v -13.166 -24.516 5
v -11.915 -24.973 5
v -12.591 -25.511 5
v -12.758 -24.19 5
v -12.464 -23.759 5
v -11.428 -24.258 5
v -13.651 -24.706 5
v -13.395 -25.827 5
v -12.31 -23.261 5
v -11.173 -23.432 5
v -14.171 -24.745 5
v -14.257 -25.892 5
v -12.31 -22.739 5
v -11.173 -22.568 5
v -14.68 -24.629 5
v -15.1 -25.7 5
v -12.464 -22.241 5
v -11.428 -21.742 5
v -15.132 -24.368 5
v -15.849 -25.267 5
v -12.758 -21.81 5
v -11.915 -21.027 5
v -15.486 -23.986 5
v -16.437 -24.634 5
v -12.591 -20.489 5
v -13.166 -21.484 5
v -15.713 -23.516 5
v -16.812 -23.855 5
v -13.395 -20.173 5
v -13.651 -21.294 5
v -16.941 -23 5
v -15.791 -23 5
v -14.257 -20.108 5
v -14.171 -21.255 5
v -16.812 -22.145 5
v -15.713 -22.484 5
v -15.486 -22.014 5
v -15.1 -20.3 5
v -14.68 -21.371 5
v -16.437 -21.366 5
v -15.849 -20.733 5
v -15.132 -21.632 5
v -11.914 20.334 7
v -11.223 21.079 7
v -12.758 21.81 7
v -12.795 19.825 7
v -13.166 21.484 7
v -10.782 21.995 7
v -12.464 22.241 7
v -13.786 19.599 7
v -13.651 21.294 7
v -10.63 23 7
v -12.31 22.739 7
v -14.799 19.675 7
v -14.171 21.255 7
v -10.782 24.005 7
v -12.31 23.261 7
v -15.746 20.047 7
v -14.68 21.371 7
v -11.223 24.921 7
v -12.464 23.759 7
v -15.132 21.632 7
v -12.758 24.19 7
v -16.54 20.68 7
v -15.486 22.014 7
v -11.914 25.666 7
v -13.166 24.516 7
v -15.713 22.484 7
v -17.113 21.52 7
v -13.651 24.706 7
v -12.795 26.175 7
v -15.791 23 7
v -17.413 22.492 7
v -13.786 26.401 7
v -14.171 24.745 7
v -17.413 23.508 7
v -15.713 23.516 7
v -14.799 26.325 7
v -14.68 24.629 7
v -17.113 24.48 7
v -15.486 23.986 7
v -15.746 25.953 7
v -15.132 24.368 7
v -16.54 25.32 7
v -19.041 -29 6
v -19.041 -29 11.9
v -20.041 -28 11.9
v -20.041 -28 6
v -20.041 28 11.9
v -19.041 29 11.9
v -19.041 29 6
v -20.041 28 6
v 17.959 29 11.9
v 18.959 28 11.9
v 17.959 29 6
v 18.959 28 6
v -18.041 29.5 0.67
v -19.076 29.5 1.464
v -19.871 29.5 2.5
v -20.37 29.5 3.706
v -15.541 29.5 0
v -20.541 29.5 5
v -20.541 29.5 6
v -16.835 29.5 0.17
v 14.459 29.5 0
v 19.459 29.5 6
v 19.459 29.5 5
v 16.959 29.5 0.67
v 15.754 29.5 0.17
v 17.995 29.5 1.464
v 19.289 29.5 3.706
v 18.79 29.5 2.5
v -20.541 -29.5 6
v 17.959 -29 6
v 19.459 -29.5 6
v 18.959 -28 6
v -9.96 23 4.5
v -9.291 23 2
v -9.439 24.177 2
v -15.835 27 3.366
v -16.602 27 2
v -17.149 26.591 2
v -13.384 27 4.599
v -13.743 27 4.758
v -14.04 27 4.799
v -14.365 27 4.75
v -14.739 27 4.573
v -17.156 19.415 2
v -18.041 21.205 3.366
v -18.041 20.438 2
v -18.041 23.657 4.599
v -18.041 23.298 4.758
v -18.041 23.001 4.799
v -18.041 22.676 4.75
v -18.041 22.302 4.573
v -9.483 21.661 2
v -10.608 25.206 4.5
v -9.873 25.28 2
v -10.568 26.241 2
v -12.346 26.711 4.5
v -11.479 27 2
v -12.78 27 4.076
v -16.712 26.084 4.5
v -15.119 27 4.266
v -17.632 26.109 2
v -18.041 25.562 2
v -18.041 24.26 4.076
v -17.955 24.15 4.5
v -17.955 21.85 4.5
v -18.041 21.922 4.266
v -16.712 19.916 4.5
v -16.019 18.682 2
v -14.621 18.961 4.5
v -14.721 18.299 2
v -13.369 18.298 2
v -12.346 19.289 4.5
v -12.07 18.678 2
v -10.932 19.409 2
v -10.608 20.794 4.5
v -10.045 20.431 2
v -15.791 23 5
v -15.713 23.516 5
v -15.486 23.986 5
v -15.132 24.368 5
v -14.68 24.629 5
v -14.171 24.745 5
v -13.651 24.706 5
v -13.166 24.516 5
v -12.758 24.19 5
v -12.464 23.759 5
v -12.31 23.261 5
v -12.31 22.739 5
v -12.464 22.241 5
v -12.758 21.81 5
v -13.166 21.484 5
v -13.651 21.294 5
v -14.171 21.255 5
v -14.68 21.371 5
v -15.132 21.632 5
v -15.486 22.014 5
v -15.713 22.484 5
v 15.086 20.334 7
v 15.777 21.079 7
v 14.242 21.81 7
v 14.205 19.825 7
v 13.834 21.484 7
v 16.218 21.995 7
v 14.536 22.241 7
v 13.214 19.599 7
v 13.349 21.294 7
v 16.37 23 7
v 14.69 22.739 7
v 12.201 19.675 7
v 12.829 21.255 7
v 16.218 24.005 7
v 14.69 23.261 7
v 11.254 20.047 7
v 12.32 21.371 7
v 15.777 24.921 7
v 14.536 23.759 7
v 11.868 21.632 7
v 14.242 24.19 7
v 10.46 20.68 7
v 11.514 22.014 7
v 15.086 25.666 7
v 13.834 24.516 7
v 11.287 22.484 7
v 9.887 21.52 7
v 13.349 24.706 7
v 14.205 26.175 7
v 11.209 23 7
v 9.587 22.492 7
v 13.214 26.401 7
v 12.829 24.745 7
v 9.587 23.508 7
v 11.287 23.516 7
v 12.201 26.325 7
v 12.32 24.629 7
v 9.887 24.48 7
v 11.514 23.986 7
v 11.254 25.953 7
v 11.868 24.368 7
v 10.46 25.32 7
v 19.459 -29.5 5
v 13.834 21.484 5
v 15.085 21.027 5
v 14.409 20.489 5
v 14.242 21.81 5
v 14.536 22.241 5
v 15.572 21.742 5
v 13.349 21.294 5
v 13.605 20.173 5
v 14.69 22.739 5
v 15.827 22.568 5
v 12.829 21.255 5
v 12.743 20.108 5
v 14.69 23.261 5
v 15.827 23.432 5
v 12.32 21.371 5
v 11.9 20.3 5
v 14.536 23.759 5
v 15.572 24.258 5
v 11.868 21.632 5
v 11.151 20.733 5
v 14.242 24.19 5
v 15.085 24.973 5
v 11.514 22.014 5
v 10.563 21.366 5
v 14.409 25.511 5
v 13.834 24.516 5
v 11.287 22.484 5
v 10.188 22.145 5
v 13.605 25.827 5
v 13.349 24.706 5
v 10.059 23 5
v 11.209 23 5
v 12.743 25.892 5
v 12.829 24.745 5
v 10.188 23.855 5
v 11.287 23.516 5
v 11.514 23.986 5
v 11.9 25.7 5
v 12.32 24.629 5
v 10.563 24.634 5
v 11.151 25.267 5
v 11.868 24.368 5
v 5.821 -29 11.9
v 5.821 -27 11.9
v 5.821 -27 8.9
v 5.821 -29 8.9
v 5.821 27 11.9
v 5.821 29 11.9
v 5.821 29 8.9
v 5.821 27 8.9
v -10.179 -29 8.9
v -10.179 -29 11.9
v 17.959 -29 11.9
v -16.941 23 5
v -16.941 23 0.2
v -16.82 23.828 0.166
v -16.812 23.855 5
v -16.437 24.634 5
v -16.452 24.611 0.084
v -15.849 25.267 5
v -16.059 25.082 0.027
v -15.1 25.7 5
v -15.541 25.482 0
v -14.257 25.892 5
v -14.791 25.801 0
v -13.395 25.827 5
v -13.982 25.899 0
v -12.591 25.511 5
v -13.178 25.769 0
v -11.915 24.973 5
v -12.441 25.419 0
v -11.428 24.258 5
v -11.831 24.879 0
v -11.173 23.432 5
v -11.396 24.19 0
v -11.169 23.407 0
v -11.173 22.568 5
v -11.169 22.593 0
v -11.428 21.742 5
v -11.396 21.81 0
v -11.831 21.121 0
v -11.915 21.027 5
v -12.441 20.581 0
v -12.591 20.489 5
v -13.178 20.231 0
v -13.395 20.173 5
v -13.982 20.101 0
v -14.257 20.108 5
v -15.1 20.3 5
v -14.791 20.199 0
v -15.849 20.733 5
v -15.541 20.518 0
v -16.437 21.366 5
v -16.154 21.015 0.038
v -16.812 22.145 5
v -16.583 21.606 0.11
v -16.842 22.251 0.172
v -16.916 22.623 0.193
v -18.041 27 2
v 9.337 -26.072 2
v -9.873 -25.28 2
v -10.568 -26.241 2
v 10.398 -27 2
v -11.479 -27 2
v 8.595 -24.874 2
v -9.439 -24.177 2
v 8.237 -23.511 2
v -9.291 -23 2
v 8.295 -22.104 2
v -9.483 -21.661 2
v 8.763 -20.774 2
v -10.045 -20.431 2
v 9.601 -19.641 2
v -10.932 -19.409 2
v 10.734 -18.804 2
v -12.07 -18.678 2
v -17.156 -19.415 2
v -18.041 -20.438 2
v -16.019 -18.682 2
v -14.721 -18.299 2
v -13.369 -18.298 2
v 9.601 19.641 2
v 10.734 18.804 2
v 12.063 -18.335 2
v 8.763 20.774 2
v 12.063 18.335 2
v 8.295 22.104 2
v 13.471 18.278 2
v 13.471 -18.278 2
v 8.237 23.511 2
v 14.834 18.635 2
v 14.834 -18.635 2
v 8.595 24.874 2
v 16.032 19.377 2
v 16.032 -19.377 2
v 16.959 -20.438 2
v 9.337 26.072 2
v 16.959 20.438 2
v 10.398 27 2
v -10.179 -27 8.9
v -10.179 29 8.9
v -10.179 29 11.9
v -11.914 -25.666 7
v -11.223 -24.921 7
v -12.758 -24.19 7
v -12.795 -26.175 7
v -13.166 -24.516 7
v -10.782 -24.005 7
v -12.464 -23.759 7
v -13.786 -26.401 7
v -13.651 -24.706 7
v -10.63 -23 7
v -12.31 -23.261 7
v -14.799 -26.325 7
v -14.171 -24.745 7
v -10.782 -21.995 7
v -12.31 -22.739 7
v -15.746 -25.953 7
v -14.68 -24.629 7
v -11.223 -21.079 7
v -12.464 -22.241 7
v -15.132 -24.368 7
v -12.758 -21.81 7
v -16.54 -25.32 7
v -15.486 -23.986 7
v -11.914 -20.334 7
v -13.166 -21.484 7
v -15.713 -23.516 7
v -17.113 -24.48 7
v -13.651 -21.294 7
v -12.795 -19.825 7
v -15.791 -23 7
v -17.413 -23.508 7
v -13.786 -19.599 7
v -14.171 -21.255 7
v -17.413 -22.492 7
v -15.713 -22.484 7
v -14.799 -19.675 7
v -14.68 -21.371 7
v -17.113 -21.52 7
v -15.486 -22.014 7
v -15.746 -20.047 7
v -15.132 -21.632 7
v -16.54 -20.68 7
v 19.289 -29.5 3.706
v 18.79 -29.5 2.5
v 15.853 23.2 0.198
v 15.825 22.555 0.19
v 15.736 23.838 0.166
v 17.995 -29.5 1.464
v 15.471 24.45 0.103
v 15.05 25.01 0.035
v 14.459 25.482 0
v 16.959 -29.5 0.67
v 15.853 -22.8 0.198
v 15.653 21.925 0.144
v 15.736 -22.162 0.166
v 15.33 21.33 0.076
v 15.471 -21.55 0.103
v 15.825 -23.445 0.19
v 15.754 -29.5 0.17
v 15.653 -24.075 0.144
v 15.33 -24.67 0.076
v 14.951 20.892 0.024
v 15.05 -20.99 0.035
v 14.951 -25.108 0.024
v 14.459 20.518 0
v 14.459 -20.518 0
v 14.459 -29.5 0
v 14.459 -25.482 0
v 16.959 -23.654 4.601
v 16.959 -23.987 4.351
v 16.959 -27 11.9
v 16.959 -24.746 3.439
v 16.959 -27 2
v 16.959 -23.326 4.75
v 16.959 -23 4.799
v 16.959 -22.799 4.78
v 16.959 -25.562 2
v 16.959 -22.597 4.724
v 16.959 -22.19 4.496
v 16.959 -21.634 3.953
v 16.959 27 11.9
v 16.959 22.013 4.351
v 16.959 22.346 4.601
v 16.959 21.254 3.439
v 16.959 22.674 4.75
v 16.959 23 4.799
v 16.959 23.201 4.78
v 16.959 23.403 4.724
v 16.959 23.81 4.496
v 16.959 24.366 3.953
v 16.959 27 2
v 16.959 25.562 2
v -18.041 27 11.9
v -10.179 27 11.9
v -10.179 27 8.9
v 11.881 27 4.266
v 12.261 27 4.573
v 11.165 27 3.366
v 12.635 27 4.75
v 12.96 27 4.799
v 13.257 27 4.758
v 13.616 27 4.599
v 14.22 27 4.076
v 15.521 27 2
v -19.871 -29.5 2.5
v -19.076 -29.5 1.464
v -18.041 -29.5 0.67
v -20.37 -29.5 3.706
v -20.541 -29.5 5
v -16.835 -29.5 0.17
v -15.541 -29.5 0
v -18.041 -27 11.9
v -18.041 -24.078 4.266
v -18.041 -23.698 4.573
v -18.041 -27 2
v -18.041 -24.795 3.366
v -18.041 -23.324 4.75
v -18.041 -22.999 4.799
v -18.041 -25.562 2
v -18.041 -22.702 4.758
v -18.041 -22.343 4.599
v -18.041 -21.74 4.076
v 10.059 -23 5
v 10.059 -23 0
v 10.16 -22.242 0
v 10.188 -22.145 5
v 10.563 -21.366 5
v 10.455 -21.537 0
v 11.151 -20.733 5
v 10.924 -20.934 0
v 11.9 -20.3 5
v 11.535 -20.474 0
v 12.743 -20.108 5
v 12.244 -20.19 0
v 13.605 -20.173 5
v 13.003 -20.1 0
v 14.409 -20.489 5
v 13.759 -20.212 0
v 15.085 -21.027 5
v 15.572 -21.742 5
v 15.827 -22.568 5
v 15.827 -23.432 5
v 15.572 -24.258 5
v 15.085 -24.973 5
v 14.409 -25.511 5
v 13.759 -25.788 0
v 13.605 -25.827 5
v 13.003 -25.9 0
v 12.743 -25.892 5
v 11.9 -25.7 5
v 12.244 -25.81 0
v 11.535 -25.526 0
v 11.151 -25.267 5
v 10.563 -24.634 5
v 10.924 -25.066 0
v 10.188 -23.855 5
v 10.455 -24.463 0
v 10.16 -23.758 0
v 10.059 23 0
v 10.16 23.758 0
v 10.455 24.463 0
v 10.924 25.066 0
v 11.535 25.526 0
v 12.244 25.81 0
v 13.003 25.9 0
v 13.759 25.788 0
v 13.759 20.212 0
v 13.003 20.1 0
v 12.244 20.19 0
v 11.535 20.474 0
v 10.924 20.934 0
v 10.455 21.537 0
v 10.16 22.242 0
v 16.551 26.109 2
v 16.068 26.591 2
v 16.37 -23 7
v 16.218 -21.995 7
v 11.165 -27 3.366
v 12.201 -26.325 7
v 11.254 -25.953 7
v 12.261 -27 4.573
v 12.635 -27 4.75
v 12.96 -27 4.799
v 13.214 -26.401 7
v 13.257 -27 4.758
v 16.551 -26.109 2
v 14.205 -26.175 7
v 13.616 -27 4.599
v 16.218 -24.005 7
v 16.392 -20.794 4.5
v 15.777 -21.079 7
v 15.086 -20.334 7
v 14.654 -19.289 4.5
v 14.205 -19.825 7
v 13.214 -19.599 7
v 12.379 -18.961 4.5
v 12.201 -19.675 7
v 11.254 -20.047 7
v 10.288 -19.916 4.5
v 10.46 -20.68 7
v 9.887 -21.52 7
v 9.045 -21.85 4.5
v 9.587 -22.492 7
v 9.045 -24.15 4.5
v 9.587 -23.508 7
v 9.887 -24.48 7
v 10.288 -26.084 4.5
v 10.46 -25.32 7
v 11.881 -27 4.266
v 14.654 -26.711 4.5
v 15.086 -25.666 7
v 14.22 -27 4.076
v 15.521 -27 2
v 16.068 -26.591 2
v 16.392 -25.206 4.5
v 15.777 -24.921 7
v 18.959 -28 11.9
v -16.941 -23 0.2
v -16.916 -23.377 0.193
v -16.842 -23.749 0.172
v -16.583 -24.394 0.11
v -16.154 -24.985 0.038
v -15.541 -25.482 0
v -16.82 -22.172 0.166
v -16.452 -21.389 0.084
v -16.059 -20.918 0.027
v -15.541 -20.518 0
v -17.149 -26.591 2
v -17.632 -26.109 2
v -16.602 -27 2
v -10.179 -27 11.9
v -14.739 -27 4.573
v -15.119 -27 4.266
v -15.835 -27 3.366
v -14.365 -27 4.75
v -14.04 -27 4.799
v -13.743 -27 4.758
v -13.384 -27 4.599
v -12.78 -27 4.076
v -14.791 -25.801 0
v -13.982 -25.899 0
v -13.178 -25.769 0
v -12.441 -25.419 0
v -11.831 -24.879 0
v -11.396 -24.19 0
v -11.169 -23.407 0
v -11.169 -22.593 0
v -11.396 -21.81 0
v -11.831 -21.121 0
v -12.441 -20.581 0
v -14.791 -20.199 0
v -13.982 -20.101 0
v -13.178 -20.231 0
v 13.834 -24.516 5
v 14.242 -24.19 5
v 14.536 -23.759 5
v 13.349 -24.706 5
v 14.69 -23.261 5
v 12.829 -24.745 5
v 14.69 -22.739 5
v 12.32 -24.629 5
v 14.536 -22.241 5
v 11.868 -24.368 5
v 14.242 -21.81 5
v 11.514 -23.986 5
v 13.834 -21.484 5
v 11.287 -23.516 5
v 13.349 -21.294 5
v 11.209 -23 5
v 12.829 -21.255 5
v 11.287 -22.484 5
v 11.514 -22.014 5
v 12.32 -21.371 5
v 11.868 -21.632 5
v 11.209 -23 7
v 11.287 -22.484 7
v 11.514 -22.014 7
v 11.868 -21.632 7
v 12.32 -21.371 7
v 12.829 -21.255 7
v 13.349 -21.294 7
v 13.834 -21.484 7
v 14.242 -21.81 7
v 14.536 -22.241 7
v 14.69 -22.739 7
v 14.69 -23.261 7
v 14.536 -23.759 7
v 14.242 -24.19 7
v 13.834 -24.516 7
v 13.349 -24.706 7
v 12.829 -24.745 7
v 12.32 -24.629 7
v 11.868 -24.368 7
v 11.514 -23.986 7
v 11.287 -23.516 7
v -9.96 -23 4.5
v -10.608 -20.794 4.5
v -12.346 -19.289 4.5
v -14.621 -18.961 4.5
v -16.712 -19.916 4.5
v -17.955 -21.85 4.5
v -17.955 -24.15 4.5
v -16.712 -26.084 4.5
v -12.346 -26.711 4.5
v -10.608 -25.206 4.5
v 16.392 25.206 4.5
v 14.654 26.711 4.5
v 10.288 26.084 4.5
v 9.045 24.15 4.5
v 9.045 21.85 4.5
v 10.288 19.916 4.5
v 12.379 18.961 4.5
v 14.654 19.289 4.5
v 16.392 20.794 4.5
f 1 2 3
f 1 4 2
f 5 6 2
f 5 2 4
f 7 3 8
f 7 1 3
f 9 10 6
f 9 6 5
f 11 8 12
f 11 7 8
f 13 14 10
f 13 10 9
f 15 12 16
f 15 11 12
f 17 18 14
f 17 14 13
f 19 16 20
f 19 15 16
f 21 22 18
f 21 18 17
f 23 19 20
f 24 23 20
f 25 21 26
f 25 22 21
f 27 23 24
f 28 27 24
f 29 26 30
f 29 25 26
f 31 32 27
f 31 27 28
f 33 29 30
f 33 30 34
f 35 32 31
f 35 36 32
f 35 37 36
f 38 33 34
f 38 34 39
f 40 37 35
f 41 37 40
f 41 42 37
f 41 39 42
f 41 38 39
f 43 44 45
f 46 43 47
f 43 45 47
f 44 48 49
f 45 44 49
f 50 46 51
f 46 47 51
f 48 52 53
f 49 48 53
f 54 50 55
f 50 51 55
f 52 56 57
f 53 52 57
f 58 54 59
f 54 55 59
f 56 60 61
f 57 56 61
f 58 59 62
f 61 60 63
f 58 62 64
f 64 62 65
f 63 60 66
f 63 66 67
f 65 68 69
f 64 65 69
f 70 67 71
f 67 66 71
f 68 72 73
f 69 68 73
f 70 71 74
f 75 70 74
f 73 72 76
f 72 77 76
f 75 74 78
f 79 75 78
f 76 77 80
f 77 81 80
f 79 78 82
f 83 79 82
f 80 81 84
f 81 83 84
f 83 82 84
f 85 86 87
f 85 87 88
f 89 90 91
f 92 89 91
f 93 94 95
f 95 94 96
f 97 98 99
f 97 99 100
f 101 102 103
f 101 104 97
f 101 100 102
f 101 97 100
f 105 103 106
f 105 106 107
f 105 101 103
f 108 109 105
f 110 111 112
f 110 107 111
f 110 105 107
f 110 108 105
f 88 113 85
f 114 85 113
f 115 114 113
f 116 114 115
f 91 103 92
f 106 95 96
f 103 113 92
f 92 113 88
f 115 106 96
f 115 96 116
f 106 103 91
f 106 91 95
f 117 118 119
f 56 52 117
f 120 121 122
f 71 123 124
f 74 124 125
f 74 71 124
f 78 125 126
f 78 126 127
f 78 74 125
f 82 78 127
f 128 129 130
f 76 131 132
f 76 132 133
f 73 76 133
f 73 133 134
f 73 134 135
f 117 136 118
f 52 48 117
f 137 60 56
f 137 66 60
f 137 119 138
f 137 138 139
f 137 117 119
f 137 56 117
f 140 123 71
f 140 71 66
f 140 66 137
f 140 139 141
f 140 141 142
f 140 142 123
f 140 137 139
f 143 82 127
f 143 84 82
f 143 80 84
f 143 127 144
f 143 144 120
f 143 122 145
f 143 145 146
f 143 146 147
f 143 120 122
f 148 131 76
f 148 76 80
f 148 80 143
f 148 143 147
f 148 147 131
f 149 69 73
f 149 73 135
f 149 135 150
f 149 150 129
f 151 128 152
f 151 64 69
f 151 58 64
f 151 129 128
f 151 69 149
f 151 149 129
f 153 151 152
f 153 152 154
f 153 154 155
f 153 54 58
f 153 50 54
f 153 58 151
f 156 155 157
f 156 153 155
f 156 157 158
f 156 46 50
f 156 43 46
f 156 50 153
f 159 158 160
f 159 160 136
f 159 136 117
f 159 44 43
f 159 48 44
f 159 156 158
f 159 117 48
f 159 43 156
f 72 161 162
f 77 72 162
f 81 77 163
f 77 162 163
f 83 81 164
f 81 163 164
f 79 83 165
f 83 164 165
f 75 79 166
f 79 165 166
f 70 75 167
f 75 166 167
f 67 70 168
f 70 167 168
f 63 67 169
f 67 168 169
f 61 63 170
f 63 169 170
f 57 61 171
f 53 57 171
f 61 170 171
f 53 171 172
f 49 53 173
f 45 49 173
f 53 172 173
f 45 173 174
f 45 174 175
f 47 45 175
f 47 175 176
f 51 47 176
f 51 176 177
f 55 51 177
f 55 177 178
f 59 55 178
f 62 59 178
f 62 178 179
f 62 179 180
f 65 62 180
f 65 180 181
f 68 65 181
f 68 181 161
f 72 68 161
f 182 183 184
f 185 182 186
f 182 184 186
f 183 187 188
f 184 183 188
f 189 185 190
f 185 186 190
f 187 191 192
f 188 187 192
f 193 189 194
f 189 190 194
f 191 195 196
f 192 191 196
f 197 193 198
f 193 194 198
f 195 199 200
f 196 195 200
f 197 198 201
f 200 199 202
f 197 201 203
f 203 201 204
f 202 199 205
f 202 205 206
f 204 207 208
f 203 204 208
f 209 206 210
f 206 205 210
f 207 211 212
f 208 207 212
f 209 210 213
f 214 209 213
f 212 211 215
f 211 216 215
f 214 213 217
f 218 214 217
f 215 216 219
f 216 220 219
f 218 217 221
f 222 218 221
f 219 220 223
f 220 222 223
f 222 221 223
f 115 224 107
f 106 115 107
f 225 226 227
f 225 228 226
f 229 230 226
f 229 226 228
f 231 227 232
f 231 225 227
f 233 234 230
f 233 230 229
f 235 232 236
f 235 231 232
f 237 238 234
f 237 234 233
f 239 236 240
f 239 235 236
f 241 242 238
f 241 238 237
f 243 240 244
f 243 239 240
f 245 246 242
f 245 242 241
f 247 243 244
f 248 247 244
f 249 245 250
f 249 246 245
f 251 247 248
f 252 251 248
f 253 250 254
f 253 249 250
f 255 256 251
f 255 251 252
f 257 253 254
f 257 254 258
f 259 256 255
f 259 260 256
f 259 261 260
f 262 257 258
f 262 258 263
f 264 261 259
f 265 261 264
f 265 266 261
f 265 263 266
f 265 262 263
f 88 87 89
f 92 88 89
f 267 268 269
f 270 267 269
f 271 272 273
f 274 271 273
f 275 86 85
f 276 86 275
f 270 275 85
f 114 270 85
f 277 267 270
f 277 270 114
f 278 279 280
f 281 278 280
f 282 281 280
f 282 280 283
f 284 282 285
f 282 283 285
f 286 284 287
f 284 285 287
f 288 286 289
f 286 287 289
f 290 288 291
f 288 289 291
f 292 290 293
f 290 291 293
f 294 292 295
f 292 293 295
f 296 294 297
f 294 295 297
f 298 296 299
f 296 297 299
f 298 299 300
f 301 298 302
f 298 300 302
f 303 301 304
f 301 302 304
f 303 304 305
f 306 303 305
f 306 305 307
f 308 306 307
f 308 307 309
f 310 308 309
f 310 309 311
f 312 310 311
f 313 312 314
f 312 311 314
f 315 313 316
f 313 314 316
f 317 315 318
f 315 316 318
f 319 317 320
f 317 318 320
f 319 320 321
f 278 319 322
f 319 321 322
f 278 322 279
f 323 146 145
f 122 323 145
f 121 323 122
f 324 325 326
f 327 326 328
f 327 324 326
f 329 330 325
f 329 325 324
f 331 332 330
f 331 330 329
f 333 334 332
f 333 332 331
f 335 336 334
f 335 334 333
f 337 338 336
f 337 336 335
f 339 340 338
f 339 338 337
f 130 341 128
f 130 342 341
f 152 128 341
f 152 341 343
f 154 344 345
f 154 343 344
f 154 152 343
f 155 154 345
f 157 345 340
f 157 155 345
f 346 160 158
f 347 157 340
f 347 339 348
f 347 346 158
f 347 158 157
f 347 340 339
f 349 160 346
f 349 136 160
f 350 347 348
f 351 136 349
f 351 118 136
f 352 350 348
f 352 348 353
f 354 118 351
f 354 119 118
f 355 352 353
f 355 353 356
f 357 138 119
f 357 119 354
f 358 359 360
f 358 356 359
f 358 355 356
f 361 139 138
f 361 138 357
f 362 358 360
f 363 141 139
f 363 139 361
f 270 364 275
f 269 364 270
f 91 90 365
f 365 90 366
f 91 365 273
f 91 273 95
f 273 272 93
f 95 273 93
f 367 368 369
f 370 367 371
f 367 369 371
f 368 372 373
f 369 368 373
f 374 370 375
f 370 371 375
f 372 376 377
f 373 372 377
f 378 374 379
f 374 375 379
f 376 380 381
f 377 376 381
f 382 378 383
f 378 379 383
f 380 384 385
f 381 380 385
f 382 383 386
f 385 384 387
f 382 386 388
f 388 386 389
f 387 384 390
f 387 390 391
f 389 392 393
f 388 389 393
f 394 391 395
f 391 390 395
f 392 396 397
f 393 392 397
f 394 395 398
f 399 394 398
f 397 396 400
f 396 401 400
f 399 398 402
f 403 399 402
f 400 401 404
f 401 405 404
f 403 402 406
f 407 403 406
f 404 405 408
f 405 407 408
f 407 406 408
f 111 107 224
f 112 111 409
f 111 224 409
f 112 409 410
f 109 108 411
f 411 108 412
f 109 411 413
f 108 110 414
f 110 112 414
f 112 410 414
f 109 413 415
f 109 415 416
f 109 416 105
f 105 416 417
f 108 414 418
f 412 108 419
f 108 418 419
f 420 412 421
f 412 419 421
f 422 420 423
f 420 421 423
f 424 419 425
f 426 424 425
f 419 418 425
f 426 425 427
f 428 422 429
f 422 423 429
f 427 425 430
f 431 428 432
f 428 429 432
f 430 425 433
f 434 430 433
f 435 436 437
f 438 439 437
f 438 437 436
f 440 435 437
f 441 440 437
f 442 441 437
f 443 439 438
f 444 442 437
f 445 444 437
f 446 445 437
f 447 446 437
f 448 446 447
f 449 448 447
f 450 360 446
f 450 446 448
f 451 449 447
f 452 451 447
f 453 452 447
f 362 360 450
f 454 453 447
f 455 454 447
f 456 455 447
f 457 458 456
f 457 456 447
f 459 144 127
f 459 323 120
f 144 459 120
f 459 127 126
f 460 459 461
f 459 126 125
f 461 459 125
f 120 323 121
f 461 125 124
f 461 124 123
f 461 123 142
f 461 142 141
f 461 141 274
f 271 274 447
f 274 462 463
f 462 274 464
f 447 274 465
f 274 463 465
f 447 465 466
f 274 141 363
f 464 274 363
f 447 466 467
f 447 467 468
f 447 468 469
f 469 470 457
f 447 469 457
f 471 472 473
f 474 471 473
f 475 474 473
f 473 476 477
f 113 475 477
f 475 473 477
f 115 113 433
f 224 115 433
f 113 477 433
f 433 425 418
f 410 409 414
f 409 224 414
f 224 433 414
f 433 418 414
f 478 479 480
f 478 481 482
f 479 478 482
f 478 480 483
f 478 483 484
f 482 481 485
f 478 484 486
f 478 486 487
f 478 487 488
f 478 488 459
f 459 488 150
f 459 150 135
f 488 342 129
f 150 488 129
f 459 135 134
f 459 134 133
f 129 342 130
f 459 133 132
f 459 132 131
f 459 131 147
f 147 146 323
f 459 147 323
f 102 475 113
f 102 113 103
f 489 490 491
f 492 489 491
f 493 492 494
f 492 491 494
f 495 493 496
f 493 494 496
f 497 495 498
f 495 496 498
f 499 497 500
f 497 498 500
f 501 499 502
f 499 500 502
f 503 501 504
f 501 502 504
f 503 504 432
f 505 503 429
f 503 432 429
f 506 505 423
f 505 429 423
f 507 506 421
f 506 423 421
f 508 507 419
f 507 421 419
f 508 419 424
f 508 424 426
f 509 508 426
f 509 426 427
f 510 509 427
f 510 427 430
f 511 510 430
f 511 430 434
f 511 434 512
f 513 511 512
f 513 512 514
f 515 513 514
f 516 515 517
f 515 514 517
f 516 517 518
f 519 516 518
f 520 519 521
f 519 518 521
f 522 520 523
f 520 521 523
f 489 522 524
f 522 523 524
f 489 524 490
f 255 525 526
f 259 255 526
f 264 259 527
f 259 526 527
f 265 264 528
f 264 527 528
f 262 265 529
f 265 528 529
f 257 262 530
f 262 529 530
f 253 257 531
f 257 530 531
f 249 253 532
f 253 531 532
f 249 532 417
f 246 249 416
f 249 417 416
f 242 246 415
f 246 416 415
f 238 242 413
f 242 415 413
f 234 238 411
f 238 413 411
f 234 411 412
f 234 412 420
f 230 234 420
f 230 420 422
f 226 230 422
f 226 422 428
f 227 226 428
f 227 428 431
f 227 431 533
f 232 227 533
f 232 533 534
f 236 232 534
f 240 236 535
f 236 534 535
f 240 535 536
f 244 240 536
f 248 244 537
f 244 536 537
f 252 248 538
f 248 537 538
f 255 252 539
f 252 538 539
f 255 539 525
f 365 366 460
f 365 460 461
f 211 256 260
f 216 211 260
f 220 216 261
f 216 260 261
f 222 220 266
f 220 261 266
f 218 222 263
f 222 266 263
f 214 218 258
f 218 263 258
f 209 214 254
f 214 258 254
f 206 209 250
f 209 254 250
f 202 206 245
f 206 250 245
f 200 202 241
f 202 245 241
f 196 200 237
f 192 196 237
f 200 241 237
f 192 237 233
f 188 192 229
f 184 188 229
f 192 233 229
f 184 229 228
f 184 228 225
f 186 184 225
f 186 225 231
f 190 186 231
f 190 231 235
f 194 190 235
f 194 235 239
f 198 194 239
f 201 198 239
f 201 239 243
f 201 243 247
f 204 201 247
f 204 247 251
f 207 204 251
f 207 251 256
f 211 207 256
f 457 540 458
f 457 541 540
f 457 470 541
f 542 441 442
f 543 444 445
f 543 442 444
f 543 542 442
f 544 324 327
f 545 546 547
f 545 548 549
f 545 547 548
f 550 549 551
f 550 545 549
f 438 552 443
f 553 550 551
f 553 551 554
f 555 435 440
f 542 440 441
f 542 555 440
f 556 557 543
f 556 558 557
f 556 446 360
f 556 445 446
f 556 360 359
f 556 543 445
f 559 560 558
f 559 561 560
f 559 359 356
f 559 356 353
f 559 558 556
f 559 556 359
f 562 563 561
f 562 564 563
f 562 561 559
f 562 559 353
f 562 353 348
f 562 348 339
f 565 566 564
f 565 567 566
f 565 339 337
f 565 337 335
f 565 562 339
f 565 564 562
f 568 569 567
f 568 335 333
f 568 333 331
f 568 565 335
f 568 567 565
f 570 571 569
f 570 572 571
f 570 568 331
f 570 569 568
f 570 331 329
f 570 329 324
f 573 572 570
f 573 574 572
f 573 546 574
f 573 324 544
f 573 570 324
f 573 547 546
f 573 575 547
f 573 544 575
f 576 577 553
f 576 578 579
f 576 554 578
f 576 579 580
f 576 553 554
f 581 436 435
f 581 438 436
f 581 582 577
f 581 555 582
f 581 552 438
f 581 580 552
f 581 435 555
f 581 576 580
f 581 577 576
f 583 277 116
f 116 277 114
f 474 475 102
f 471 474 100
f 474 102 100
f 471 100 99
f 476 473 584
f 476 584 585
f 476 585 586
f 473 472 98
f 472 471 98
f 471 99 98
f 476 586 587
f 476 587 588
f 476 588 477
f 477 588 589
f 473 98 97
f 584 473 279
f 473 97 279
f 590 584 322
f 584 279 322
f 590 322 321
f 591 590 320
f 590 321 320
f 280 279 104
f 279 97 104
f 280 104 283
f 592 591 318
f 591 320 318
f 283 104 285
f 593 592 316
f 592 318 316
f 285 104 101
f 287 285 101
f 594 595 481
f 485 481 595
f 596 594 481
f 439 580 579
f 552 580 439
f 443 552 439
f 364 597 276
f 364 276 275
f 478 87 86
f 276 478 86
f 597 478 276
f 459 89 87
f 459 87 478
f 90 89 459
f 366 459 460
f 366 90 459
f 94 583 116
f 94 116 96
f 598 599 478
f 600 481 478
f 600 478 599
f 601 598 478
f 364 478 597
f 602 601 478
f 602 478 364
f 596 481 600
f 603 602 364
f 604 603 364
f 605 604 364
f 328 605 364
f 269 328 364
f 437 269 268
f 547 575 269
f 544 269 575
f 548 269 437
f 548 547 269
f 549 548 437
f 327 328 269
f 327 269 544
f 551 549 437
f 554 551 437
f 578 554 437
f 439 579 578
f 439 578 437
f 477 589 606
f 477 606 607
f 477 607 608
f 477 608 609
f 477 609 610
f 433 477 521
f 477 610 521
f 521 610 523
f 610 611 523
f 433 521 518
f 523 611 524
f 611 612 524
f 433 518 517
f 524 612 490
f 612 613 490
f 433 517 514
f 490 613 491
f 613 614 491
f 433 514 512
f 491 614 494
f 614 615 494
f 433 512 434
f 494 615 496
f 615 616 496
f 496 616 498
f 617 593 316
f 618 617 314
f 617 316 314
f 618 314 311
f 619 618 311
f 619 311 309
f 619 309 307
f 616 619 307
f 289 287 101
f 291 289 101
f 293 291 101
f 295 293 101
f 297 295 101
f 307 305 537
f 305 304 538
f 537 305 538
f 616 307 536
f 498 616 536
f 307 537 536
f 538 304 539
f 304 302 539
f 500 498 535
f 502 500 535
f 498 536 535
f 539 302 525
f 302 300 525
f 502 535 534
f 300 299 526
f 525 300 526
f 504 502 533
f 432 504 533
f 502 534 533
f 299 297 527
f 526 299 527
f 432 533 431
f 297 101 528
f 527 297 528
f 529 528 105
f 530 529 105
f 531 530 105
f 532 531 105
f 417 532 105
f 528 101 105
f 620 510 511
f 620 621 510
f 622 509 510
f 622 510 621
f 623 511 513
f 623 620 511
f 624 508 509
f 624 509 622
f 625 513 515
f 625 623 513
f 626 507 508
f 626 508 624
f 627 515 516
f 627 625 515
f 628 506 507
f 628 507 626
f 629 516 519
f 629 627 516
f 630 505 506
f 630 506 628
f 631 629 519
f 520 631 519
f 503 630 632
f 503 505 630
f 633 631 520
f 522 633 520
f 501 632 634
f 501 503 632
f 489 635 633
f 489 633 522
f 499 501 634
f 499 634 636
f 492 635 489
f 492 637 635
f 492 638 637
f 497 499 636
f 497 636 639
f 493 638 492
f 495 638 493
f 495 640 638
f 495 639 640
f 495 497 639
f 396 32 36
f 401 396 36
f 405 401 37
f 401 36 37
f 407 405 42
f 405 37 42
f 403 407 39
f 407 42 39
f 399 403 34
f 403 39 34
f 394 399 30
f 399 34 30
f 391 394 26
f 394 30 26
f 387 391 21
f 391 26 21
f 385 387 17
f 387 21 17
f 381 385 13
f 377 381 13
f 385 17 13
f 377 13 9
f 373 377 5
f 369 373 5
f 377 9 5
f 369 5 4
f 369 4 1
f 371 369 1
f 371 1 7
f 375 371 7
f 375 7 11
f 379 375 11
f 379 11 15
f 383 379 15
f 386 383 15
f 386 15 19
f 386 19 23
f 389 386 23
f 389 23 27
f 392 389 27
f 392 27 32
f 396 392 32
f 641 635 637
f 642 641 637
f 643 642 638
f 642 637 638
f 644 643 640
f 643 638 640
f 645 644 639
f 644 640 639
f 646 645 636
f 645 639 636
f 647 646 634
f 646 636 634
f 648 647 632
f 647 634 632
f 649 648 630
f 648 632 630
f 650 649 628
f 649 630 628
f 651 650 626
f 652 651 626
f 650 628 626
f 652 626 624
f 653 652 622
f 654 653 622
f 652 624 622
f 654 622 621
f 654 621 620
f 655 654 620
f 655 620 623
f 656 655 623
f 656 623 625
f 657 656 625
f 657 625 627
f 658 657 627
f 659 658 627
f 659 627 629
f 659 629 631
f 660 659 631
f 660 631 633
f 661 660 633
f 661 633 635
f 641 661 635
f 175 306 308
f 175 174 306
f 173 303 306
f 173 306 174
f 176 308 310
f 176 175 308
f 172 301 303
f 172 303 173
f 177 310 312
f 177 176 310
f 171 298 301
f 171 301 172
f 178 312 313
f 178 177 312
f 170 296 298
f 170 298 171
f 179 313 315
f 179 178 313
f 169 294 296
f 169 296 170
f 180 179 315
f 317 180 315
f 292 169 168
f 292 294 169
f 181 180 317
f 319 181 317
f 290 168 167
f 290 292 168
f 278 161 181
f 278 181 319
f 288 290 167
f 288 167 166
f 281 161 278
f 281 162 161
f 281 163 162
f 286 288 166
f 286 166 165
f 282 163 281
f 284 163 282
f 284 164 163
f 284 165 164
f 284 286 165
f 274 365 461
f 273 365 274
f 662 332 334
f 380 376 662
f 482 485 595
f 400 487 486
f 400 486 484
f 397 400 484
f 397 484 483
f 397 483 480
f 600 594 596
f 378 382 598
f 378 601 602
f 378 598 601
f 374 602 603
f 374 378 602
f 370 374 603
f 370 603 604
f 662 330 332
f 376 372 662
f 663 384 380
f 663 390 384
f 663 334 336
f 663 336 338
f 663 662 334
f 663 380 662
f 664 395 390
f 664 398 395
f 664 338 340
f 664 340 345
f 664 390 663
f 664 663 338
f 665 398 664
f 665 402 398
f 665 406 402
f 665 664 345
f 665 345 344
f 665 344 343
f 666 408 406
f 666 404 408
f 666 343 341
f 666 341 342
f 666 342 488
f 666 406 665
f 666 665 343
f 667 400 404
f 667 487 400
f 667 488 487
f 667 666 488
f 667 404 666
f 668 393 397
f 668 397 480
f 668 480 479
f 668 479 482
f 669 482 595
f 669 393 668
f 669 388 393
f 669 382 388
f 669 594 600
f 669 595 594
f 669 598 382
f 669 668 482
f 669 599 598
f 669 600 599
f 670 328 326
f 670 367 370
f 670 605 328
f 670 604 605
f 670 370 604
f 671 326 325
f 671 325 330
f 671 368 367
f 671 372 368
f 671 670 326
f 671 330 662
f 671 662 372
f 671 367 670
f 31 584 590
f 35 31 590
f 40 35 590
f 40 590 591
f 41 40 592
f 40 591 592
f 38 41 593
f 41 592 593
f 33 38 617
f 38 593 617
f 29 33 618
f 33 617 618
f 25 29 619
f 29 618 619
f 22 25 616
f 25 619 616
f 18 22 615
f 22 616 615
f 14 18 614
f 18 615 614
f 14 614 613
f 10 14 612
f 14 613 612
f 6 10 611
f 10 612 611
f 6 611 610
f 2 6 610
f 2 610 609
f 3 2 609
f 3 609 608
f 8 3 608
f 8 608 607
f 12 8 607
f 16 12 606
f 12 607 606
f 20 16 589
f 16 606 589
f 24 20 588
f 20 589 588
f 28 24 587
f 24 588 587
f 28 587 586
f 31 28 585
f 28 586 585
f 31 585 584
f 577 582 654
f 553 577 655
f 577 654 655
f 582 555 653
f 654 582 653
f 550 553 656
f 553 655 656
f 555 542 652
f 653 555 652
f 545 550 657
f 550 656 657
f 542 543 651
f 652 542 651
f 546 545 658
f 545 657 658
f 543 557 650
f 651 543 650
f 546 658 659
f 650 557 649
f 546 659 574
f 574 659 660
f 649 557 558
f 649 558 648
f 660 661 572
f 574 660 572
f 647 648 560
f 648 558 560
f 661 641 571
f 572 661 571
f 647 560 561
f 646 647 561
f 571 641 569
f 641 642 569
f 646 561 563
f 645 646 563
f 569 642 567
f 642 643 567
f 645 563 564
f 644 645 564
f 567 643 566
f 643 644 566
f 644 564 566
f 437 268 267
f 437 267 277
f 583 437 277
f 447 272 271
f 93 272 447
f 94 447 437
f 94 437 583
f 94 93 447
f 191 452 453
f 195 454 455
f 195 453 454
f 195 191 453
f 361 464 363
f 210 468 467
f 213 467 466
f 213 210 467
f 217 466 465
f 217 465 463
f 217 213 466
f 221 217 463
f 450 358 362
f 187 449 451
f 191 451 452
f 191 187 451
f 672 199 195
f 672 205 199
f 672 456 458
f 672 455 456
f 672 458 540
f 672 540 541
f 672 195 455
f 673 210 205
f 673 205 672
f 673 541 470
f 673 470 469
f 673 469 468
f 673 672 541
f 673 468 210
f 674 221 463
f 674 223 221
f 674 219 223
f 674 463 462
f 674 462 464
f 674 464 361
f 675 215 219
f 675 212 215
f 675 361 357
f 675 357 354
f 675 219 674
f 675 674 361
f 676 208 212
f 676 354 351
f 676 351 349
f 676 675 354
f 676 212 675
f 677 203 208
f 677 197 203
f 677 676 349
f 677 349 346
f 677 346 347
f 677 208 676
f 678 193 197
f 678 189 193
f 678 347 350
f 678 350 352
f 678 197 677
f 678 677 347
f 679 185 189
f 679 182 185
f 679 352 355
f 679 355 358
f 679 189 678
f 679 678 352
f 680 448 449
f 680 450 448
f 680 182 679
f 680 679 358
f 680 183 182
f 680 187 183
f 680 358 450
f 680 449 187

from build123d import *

# Parameters (mm, degrees)
BASE_W              = 40
BASE_H              = 59
EXTRUDE_1_DEPTH     = 2
SKETCH_2_W          = 40
SKETCH_2_H          = 59
SKETCH_2_W_2        = 35
SKETCH_2_H_2        = 54
EXTRUDE_2_DEPTH     = 10
SKETCH_3_R          = 3.25
EXTRUDE_3_DEPTH     = 5
SKETCH_4_R          = 2.9
CUT_EXTRUDE_2_DEPTH = 5
CHAMFER_1_SIZE      = 1.5
CHAMFER_1_SIZE_2    = 5.598076211
SKETCH_6_R          = 1.75
CUT_EXTRUDE_3_DEPTH = 38.896736188
FILLET_1_R          = 5
SKETCH_7_W          = 40
SKETCH_7_H          = 59
SKETCH_7_W_2        = 39
SKETCH_7_H_2        = 58
CUT_EXTRUDE_6_DEPTH = 6
CHAMFER_2_SIZE      = 1
SKETCH_8_W          = 43.293299122
SKETCH_8_H          = 71.249143308
CUT_EXTRUDE_7_DEPTH = 0.1
SKETCH_9_W          = 16
SKETCH_9_H          = 3
CUT_EXTRUDE_8_DEPTH = 64.13297577


with BuildPart() as part:
    # base → Бобышка-Вытянуть1 (new body)
    with BuildSketch(Plane.XY):
        with Locations((-0.540511526, 0)):
            Rectangle(BASE_W, BASE_H)
    extrude(amount=EXTRUDE_1_DEPTH)

    # Эскиз2 → Бобышка-Вытянуть2 (add)
    with BuildSketch(Plane.XY.offset(2)):
        with Locations((-0.540511526, 0)):
            Rectangle(SKETCH_2_W, SKETCH_2_H)
        with Locations((-0.540511526, 0)):
            Rectangle(SKETCH_2_W_2, SKETCH_2_H_2, mode=Mode.SUBTRACT)
    extrude(amount=EXTRUDE_2_DEPTH)

    # Эскиз3 → Бобышка-Вытянуть3 (add)
    with BuildSketch(Plane.XY.offset(2)):
        with Locations((-14.040511526, -23)):
            Circle(SKETCH_3_R)
        with Locations((12.959488474, -23)):
            Circle(SKETCH_3_R)
        with Locations((12.959488474, 23)):
            Circle(SKETCH_3_R)
        with Locations((-14.040511526, 23)):
            Circle(SKETCH_3_R)
    extrude(amount=EXTRUDE_3_DEPTH)

    # Эскиз4 → Вырез-Вытянуть2 (cut)
    with BuildSketch(Plane(origin=(0, 0, 0), x_dir=(-1, 0, 0), z_dir=(0, 0, -1))):
        with Locations((14.040511526, -23)):
            Circle(SKETCH_4_R)
        with Locations((-12.959488474, -23)):
            Circle(SKETCH_4_R)
        with Locations((-12.959488474, 23)):
            Circle(SKETCH_4_R)
        with Locations((14.040511526, 23)):
            Circle(SKETCH_4_R)
    extrude(amount=-CUT_EXTRUDE_2_DEPTH, mode=Mode.SUBTRACT)

    # Фаска1
    # the kernel refuses this chamfer: 5.598076211, 1.5 mm, written as the material it adds along each edge
    with BuildSketch(Plane(origin=(-14.040511526, 23, 2), x_dir=(1, 0, 0), z_dir=(0, -1, 0))) as chamfer_1_piece_1_section:
        Polygon((3.25 + CHAMFER_1_SIZE, 0), (3.25, CHAMFER_1_SIZE_2), (3.25, 0), align=None)
    chamfer_1_piece_1 = revolve(axis=Axis((-14.040511526, 23, 2), (0, 0, 1)), mode=Mode.PRIVATE)
    chamfer_1_piece_1 = split(chamfer_1_piece_1, bisect_by=Plane(origin=(-14.040511526, 23, 7), z_dir=(0, 0, -1)), keep=Keep.TOP, mode=Mode.PRIVATE)
    add(chamfer_1_piece_1)
    with BuildSketch(Plane(origin=(12.959488474, 23, 2), x_dir=(1, 0, 0), z_dir=(0, -1, 0))) as chamfer_1_piece_2_section:
        Polygon((3.25 + CHAMFER_1_SIZE, 0), (3.25, CHAMFER_1_SIZE_2), (3.25, 0), align=None)
    chamfer_1_piece_2 = revolve(axis=Axis((12.959488474, 23, 2), (0, 0, 1)), mode=Mode.PRIVATE)
    chamfer_1_piece_2 = split(chamfer_1_piece_2, bisect_by=Plane(origin=(12.959488474, 23, 7), z_dir=(0, 0, -1)), keep=Keep.TOP, mode=Mode.PRIVATE)
    add(chamfer_1_piece_2)
    with BuildSketch(Plane(origin=(-14.040511526, -23, 2), x_dir=(1, 0, 0), z_dir=(0, -1, 0))) as chamfer_1_piece_3_section:
        Polygon((3.25 + CHAMFER_1_SIZE, 0), (3.25, CHAMFER_1_SIZE_2), (3.25, 0), align=None)
    chamfer_1_piece_3 = revolve(axis=Axis((-14.040511526, -23, 2), (0, 0, 1)), mode=Mode.PRIVATE)
    chamfer_1_piece_3 = split(chamfer_1_piece_3, bisect_by=Plane(origin=(-14.040511526, -23, 7), z_dir=(0, 0, -1)), keep=Keep.TOP, mode=Mode.PRIVATE)
    add(chamfer_1_piece_3)
    with BuildSketch(Plane(origin=(12.959488474, -23, 2), x_dir=(1, 0, 0), z_dir=(0, -1, 0))) as chamfer_1_piece_4_section:
        Polygon((3.25 + CHAMFER_1_SIZE, 0), (3.25, CHAMFER_1_SIZE_2), (3.25, 0), align=None)
    chamfer_1_piece_4 = revolve(axis=Axis((12.959488474, -23, 2), (0, 0, 1)), mode=Mode.PRIVATE)
    chamfer_1_piece_4 = split(chamfer_1_piece_4, bisect_by=Plane(origin=(12.959488474, -23, 7), z_dir=(0, 0, -1)), keep=Keep.TOP, mode=Mode.PRIVATE)
    add(chamfer_1_piece_4)

    # Эскиз6 → Вырез-Вытянуть3 (cut, through all)
    with BuildSketch(Plane(origin=(0, 0, 0), x_dir=(-1, 0, 0), z_dir=(0, 0, -1))):
        with Locations((-12.959488474, 23)):
            Circle(SKETCH_6_R)
        with Locations((14.040511526, 23)):
            Circle(SKETCH_6_R)
        with Locations((14.040511526, -23)):
            Circle(SKETCH_6_R)
        with Locations((-12.959488474, -23)):
            Circle(SKETCH_6_R)
    extrude(amount=-CUT_EXTRUDE_3_DEPTH, mode=Mode.SUBTRACT)

    # Скругление1
    # the kernel refuses this fillet: 5 mm, written as the material it takes off along each edge
    with BuildSketch(Plane(origin=(19.459488474, -42, 0), x_dir=(0, 0, 1), z_dir=(0, 1, 0)), Plane(origin=(-20.540511526, 42, 0), x_dir=(0, 0, 1), z_dir=(0, -1, 0))) as fillet_1_piece_1:
        with BuildLine():
            CenterArc((FILLET_1_R, -FILLET_1_R), FILLET_1_R, 90, 90)
            Line((0, -FILLET_1_R), (0, 0))
            Line((0, 0), (FILLET_1_R, 0))
        make_face()
    extrude(amount=84, mode=Mode.SUBTRACT)

    # Эскиз7 → Вырез-Вытянуть6 (cut)
    with BuildSketch(Plane.XY.offset(12)):
        with Locations((-0.540511526, 0)):
            Rectangle(SKETCH_7_W, SKETCH_7_H)
        with Locations((-0.540511526, 0)):
            Rectangle(SKETCH_7_W_2, SKETCH_7_H_2, mode=Mode.SUBTRACT)
    extrude(amount=-CUT_EXTRUDE_6_DEPTH, mode=Mode.SUBTRACT)

    # Фаска2
    chamfer_2_edges = [part.edges().sort_by_distance(p)[0] for p in [
        (-20.040511526, 29, 9),
        (-20.040511526, -29, 9),
        (18.959488474, -29, 9),
        (18.959488474, 29, 9),
    ]]
    chamfer(chamfer_2_edges, length=CHAMFER_2_SIZE)

    # Эскиз8 → Вырез-Вытянуть7 (cut)
    with BuildSketch(Plane.XY.offset(12)):
        with Locations((-1.042207714, -0.462672782)):
            Rectangle(SKETCH_8_W, SKETCH_8_H)
    extrude(amount=-CUT_EXTRUDE_7_DEPTH, mode=Mode.SUBTRACT)

    # Эскиз9 → Вырез-Вытянуть8 (cut, through all)
    with BuildSketch(Plane(origin=(0, 29, 0), x_dir=(1, 0, 0), z_dir=(0, 1, 0))):
        with Locations((-2.179108085, -10.4)):
            Rectangle(SKETCH_9_W, SKETCH_9_H)
    extrude(amount=-CUT_EXTRUDE_8_DEPTH, mode=Mode.SUBTRACT)


solid = part.part
